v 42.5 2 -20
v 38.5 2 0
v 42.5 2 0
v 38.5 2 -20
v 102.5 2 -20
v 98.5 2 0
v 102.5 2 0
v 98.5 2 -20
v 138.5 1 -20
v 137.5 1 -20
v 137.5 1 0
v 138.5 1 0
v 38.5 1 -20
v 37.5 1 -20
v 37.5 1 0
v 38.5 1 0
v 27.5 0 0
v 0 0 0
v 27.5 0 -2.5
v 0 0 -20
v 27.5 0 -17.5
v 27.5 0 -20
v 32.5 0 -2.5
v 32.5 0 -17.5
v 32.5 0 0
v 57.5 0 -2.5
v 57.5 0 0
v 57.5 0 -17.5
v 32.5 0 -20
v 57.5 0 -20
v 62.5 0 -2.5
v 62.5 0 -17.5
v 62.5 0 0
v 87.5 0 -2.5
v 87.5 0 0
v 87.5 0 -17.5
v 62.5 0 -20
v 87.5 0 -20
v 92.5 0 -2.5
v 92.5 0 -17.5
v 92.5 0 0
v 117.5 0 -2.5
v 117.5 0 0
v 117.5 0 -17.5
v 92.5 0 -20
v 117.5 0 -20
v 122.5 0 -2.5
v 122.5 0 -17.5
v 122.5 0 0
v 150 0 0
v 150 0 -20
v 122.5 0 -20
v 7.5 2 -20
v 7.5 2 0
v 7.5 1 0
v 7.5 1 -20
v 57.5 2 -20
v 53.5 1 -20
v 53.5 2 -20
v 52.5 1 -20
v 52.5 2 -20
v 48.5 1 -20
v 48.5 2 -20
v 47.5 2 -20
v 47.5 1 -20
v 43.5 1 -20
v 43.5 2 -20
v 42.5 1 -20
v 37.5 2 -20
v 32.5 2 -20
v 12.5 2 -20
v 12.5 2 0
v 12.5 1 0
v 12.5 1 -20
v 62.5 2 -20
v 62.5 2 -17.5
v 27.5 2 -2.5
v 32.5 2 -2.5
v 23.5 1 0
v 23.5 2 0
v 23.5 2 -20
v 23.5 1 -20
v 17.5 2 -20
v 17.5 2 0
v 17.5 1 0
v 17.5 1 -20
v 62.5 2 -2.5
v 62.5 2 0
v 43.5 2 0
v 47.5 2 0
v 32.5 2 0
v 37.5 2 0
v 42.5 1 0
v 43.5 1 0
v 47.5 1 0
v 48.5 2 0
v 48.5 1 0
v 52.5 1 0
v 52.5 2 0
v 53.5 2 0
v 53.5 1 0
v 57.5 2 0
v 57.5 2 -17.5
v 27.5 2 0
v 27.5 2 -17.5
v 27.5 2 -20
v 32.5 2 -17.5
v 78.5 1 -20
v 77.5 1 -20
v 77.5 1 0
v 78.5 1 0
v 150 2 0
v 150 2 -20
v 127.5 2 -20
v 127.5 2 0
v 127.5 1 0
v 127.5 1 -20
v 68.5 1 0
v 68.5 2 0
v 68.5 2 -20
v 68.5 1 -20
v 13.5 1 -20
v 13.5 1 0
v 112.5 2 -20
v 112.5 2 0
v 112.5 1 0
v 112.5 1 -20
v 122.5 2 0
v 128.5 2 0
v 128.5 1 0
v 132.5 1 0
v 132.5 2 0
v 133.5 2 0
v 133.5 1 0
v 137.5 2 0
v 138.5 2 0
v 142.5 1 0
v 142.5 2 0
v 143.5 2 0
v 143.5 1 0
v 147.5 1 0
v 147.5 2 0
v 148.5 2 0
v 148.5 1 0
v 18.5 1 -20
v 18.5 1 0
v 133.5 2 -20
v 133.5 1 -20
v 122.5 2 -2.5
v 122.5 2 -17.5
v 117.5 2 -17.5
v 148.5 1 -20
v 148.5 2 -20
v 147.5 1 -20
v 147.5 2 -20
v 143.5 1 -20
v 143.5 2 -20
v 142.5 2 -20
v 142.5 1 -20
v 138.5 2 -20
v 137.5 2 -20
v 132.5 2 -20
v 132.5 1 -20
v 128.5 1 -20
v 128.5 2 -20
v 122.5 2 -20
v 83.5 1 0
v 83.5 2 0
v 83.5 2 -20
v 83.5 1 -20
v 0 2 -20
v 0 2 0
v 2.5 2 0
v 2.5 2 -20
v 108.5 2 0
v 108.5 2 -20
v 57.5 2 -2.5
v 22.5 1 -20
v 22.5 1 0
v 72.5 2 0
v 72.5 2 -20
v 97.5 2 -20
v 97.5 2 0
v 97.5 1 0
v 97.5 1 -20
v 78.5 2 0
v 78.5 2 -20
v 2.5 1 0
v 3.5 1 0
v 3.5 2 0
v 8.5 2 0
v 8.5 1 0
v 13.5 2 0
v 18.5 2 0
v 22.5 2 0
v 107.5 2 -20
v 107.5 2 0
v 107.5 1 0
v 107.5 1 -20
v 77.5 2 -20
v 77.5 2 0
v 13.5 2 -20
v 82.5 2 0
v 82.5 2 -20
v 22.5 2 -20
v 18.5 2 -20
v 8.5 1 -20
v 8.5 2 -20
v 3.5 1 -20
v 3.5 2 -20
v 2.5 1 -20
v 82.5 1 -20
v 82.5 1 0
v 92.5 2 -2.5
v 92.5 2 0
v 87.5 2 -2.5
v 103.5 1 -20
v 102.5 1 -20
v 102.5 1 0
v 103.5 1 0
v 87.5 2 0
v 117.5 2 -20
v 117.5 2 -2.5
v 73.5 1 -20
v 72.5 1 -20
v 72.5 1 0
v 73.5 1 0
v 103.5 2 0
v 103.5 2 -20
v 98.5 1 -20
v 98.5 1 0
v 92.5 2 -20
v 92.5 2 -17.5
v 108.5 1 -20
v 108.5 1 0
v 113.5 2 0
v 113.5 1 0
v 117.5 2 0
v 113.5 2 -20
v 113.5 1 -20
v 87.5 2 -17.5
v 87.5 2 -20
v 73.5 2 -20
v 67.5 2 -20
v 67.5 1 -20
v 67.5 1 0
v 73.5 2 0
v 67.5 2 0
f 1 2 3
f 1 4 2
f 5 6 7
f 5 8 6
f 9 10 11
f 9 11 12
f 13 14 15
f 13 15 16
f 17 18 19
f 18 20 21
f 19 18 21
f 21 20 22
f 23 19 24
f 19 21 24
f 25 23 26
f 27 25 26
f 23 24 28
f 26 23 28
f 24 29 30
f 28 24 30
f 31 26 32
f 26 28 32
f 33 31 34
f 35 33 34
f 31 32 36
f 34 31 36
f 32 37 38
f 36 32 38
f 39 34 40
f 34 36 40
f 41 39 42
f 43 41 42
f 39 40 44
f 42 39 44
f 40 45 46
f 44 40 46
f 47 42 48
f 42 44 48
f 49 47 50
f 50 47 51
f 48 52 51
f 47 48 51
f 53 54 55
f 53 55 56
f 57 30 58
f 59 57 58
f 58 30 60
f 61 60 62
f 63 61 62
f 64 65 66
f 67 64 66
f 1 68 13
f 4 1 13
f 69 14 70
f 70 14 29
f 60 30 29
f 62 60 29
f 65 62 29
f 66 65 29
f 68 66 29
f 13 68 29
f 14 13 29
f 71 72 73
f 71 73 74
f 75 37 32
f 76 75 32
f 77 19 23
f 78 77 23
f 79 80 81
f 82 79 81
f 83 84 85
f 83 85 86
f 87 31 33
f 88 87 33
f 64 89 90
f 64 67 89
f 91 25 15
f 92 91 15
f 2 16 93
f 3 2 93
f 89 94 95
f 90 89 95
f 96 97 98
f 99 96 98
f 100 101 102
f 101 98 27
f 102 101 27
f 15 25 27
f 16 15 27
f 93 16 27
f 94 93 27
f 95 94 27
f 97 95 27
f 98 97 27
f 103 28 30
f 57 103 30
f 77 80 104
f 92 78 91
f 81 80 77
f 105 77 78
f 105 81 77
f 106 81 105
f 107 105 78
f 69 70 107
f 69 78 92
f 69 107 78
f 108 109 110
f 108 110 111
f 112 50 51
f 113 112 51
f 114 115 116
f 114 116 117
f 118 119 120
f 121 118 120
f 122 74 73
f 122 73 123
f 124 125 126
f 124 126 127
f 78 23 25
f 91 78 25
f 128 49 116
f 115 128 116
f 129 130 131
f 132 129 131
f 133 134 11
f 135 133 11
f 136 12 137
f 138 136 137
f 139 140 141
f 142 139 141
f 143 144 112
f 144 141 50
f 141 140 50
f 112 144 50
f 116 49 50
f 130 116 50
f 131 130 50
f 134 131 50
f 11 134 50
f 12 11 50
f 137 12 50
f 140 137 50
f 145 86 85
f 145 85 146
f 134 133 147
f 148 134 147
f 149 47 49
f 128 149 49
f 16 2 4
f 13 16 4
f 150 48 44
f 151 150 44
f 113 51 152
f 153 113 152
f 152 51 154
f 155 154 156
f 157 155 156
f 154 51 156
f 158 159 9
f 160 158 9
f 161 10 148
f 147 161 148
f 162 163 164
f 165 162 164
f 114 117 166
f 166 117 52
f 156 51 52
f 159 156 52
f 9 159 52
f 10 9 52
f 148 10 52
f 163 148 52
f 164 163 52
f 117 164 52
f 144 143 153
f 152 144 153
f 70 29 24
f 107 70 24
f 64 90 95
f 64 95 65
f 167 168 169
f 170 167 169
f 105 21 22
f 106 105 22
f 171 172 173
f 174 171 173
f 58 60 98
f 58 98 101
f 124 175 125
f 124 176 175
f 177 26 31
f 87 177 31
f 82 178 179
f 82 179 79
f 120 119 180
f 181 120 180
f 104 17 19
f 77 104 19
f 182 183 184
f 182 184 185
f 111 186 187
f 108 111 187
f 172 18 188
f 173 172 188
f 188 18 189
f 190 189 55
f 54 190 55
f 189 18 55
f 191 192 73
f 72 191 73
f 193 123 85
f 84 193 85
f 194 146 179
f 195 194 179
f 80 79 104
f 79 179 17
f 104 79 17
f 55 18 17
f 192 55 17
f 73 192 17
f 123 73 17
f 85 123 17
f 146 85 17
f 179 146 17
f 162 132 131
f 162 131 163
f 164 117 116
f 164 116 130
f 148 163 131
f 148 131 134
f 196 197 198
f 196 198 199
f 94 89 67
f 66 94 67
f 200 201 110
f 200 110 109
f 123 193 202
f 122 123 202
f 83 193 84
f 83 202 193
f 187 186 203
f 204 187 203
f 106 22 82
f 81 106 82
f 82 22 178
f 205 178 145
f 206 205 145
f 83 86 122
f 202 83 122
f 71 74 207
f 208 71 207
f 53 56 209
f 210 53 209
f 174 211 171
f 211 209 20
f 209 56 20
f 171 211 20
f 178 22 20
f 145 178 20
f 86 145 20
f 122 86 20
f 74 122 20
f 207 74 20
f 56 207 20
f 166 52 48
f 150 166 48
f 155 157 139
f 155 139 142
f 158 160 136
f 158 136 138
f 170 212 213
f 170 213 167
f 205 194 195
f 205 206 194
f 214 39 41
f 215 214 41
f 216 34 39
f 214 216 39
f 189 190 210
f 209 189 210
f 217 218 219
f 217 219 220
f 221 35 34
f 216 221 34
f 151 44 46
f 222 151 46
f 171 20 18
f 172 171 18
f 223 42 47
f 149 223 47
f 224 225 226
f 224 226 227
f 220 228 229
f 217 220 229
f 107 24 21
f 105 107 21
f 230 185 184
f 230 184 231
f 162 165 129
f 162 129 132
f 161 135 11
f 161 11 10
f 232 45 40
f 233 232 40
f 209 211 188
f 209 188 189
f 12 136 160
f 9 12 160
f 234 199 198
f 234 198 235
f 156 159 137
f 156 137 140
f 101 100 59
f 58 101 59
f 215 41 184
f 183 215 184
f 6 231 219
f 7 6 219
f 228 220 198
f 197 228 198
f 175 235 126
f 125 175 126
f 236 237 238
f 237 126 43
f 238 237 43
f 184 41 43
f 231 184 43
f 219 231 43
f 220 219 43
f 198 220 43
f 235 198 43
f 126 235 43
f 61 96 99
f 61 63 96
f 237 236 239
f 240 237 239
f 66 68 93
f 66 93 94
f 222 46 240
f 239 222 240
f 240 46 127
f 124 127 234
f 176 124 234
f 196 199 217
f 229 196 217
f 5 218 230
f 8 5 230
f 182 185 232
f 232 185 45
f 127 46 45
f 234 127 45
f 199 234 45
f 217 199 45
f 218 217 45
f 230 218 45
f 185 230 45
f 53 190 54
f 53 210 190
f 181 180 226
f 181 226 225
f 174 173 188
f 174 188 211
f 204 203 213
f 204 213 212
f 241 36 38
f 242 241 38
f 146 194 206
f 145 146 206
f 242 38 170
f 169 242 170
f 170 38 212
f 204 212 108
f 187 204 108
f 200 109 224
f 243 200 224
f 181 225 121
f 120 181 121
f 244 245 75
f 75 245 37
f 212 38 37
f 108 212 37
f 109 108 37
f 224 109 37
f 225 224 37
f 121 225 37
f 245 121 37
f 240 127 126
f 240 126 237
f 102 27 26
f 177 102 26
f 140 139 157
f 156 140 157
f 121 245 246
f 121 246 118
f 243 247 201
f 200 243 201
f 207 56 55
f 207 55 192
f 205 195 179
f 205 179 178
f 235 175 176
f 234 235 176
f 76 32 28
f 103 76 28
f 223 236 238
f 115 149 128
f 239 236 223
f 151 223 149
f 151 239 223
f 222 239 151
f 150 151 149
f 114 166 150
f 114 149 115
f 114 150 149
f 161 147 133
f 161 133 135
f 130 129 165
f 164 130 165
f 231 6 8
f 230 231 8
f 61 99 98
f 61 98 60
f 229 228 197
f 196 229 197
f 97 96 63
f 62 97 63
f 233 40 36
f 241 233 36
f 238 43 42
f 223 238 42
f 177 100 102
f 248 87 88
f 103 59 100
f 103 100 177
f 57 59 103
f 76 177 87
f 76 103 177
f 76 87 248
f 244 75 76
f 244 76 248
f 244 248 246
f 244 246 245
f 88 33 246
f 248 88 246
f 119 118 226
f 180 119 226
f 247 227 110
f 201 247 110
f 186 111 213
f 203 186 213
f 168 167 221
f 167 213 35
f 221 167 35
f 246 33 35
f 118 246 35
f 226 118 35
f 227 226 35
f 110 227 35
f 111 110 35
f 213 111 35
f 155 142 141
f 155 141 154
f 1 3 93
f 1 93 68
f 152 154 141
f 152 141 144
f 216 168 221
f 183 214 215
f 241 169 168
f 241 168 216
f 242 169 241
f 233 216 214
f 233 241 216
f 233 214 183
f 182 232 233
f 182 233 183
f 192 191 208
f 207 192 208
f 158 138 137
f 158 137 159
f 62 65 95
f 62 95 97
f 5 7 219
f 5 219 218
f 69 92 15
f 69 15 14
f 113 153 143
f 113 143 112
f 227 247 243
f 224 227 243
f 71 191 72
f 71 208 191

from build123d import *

# Parameters (mm, degrees)
BOSS_EXTRUDE1_DEPTH = 2
SKETCH2_W           = 1
SKETCH2_H           = 20
CUT_EXTRUDE1_DEPTH  = 1


with BuildPart() as part:
    # Sketch1 → Boss-Extrude1 (new body)
    with BuildSketch(Plane(origin=(0, 0, 0), x_dir=(1, 0, 0), z_dir=(0, 1, 0))):
        Polygon((122.5, 2.5), (122.5, 0), (150, 0), (150, 20), (122.5, 20), (122.5, 17.5), (117.5, 17.5), (117.5, 20), (92.5, 20), (92.5, 17.5), (87.5, 17.5), (87.5, 20), (62.5, 20), (62.5, 17.5), (57.5, 17.5), (57.5, 20), (32.5, 20), (32.5, 17.5), (27.5, 17.5), (27.5, 20), (0, 20), (0, 0), (27.5, 0), (27.5, 2.5), (32.5, 2.5), (32.5, 0), (57.5, 0), (57.5, 2.5), (62.5, 2.5), (62.5, 0), (87.5, 0), (87.5, 2.5), (92.5, 2.5), (92.5, 0), (117.5, 0), (117.5, 2.5), align=None)
    extrude(amount=BOSS_EXTRUDE1_DEPTH)

    # Sketch2 → Cut-Extrude1 (cut)
    with BuildSketch(Plane(origin=(0, 2, 0), x_dir=(1, 0, 0), z_dir=(0, 1, 0))):
        with Locations((3, 10)):
            Rectangle(SKETCH2_W, SKETCH2_H)
        with Locations((8, 10)):
            Rectangle(SKETCH2_W, SKETCH2_H)
        with Locations((13, 10)):
            Rectangle(SKETCH2_W, SKETCH2_H)
        with Locations((18, 10)):
            Rectangle(SKETCH2_W, SKETCH2_H)
        with Locations((23, 10)):
            Rectangle(SKETCH2_W, SKETCH2_H)
        with Locations((38, 10)):
            Rectangle(SKETCH2_W, SKETCH2_H)
        with Locations((43, 10)):
            Rectangle(SKETCH2_W, SKETCH2_H)
        with Locations((48, 10)):
            Rectangle(SKETCH2_W, SKETCH2_H)
        with Locations((53, 10)):
            Rectangle(SKETCH2_W, SKETCH2_H)
        with Locations((68, 10)):
            Rectangle(SKETCH2_W, SKETCH2_H)
        with Locations((73, 10)):
            Rectangle(SKETCH2_W, SKETCH2_H)
        with Locations((78, 10)):
            Rectangle(SKETCH2_W, SKETCH2_H)
        with Locations((83, 10)):
            Rectangle(SKETCH2_W, SKETCH2_H)
        with Locations((98, 10)):
            Rectangle(SKETCH2_W, SKETCH2_H)
        with Locations((103, 10)):
            Rectangle(SKETCH2_W, SKETCH2_H)
        with Locations((108, 10)):
            Rectangle(SKETCH2_W, SKETCH2_H)
        with Locations((113, 10)):
            Rectangle(SKETCH2_W, SKETCH2_H)
        with Locations((128, 10)):
            Rectangle(SKETCH2_W, SKETCH2_H)
        with Locations((133, 10)):
            Rectangle(SKETCH2_W, SKETCH2_H)
        with Locations((138, 10)):
            Rectangle(SKETCH2_W, SKETCH2_H)
        with Locations((143, 10)):
            Rectangle(SKETCH2_W, SKETCH2_H)
        with Locations((148, 10)):
            Rectangle(SKETCH2_W, SKETCH2_H)
    extrude(amount=-CUT_EXTRUDE1_DEPTH, mode=Mode.SUBTRACT)


solid = part.part
